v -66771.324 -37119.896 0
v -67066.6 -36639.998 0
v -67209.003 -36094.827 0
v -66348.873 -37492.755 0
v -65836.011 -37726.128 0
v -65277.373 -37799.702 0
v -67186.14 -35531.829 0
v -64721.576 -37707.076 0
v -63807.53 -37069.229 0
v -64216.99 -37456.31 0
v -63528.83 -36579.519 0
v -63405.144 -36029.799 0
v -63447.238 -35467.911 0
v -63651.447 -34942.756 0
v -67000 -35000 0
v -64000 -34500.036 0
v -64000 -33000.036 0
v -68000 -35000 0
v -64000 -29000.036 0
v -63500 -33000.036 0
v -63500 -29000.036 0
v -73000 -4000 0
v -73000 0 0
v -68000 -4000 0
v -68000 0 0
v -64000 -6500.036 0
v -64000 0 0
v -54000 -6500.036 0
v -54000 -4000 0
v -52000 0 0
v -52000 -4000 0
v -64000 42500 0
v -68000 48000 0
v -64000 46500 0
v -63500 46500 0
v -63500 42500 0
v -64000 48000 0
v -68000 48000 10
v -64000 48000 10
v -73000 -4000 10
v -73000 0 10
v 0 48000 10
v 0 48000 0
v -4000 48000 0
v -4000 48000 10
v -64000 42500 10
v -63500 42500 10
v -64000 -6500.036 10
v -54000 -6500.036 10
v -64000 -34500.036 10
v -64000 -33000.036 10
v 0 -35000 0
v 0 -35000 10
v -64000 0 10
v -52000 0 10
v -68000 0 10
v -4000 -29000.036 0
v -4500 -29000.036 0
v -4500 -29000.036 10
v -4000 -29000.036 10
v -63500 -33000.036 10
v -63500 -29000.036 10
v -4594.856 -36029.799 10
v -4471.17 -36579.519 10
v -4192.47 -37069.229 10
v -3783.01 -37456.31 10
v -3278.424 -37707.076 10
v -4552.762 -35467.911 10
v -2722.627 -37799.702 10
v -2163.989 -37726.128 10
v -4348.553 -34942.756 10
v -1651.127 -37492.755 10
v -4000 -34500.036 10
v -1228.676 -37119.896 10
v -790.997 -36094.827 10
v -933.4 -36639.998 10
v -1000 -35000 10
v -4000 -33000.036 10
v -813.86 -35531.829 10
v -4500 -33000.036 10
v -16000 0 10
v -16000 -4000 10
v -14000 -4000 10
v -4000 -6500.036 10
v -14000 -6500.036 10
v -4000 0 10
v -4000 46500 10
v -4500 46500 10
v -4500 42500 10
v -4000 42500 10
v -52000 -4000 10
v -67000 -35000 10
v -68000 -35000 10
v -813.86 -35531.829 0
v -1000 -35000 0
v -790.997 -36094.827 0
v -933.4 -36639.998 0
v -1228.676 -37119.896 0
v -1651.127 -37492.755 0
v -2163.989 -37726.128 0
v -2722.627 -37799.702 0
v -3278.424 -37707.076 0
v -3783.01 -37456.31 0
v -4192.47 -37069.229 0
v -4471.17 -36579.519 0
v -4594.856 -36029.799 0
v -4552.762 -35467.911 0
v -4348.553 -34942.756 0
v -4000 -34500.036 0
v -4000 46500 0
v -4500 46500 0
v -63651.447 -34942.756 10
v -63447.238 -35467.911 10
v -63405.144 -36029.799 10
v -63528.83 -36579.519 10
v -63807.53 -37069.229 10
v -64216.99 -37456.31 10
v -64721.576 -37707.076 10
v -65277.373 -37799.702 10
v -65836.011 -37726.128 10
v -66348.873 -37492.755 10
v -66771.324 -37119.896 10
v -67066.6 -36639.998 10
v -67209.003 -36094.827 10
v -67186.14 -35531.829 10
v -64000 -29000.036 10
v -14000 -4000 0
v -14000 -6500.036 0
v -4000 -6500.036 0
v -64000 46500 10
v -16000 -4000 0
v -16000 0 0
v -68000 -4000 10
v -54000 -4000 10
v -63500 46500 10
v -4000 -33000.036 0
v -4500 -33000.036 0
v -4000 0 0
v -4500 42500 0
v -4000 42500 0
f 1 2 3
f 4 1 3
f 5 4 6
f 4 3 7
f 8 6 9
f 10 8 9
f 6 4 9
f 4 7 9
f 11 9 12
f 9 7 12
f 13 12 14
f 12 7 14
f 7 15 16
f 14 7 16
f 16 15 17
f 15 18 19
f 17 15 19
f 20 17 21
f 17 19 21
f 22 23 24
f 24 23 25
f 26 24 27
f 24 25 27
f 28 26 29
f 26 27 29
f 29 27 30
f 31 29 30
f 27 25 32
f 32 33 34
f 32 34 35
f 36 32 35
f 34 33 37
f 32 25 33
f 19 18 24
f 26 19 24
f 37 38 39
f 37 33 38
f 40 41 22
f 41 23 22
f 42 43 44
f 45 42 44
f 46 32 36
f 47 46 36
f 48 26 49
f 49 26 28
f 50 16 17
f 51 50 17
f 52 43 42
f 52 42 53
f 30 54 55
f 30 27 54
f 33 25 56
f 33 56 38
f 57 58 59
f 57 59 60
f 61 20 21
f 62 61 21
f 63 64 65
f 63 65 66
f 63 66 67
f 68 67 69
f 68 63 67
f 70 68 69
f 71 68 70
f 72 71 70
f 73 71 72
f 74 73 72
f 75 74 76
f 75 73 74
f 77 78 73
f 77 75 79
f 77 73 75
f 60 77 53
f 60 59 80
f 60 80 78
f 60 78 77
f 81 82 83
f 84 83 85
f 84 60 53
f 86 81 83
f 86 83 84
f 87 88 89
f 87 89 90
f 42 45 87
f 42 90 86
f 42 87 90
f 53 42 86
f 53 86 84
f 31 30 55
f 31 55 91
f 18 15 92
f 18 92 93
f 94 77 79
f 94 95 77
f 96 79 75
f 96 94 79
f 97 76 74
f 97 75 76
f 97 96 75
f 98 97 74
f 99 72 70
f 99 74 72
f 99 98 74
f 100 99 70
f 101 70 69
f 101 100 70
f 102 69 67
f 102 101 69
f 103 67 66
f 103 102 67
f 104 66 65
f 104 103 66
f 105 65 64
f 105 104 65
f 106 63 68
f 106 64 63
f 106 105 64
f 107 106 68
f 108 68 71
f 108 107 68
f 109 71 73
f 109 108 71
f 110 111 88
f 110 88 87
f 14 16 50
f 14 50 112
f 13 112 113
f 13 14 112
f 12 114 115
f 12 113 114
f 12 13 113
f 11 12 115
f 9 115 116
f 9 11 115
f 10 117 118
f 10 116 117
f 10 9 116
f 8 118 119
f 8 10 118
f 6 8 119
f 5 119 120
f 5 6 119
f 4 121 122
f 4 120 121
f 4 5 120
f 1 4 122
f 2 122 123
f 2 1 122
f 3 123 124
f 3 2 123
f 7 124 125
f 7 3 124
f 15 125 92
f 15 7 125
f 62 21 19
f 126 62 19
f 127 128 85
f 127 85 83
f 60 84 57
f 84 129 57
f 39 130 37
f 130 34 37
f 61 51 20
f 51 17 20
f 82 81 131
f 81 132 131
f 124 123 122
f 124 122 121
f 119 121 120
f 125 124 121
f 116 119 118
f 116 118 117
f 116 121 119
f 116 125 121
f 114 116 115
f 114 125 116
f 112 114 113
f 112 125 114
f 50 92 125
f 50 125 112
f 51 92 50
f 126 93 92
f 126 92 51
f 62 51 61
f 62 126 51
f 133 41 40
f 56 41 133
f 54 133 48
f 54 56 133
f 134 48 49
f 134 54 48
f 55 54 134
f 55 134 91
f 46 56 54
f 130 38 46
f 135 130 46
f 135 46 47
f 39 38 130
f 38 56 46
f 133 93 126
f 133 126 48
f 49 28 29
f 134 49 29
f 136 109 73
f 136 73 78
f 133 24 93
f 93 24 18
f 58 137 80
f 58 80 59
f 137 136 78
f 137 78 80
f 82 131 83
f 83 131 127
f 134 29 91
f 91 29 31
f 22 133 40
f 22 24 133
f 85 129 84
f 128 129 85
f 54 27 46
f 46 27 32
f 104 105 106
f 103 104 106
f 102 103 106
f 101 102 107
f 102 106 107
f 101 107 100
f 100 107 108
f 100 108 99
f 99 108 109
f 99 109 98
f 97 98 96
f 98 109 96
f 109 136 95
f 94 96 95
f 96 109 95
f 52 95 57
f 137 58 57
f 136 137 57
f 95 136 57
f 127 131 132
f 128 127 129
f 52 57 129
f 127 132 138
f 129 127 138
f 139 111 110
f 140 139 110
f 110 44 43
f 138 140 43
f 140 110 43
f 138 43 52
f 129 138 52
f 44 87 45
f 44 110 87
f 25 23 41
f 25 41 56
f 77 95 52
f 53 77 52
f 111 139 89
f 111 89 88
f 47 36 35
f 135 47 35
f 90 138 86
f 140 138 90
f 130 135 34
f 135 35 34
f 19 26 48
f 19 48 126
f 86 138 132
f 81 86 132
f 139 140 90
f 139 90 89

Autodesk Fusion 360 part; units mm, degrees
sketch "スケッチ1" plane through (0, 0, 0) normal (0, 0, 1) x (1, 0, 0)
  line L0 (0, -4000) -> (0, -35000)
  line L1 (-4000, -6500.036) -> (-14000, -6500.036)
  line L2 (-34000, 2000) -> (-34000, -2000)
  line L3 (-63500, -29000.036) -> (-64000, -29000.036)
  line L4 (-63500, 42500) -> (-63500, 46500)
  line L5 (-64000, 46500) -> (-64000, 48000)
  line L6 (-64000, -6500.036) -> (-64000, -29000.036)
  line L7 (-14000, -6500.036) -> (-14000, -4000)
  line L8 (-68000, 41000) -> (-68000, 43977.4822)
  arc A0 (-67000, -35000) -> (-64000, -34500.036) centre (-65310.0198, -35889.9814) ccw
  line L9 (-1000, -35000) -> (0, -35000)
  arc A1 (-4000, -34500.036) -> (-1000, -35000) centre (-2689.9802, -35889.9814) ccw
  line L10 (-67000, -35000) -> (-68000, -35000)
  line L11 (-4000, 46500) -> (-4000, 48000)
  line L12 (-68000, 0) -> (-68000, 41000)
  line L13 (0, 41000) -> (0, 43977.4822)
  line L14 (-63500, 46500) -> (-64000, 46500)
  line L15 (-4500, 46500) -> (-4000, 46500)
  line L16 (-64000, 42500) -> (-63500, 42500)
  line L17 (-4000, -33000.036) -> (-4500, -33000.036)
  line L18 (-68000, 43977.4822) -> (-68000, 48000)
  line L19 (-68000, 48000) -> (-64000, 48000)
  line L20 (-78000, 0) -> (-79000, 0)
  line L21 (10000, 0) -> (11000, 0)
  line L22 (-64000, -6500.036) -> (-54000, -6500.036)
  line L23 (-63500, -33000.036) -> (-63500, -29000.036)
  line L24 (-64000, -34500.036) -> (-64000, -33000.036)
  line L25 (-64000, -33000.036) -> (-63500, -33000.036)
  line L26 (-68000, -4000) -> (-68000, -35000)
  line L27 (0, 0) -> (0, 41000)
  line L28 (-64000, 0) -> (-64000, 42500)
  line L29 (-54000, -6500.036) -> (-54000, -4000)
  line L30 (-4500, 42500) -> (-4500, 46500)
  line L31 (-4000, 42500) -> (-4500, 42500)
  line L32 (-4500, -29000.036) -> (-4000, -29000.036)
  line L33 (-4000, 0) -> (-4000, 42500)
  line L34 (-4500, -33000.036) -> (-4500, -29000.036)
  line L35 (-4000, -34500.036) -> (-4000, -33000.036)
  line L36 (0, 48000) -> (-4000, 48000)
  line L37 (-4000, -6500.036) -> (-4000, -29000.036)
  line L38 (0, 43977.4822) -> (0, 48000)
  line L39 (-64000, 0) -> (-52000, 0)
  line L40 (-52000, 0) -> (-52000, -4000)
  line L41 (-54000, -4000) -> (-52000, -4000)
  line L42 (-4000, 0) -> (-16000, 0)
  line L43 (-16000, 0) -> (-16000, -4000)
  line L44 (-16000, -4000) -> (-14000, -4000)
  line L45 (0, -4000) -> (0, 0)
  line L46 (-73000, 0) -> (-73000, -4000)
  line L47 (-73000, 0) -> (-68000, 0)
  line L48 (-68000, -4000) -> (-73000, -4000)
  point P0 (-4000, -35000)
  point P1 (-64000, -35000)
  point P2 (-64000, 42500)
  point P3 (-64000, -34500.036)
  point P4 (-68000, 0)
  point P5 (-64000, -6500.036)
  point P6 (-64000, 0)
  point P7 (-4000, 0)
  point P8 (-4000, 41000)
  point P9 (-4000, 42500)
  point P10 (-4000, -6500.036)
  point P11 (-4000, -34500.036)
  point P12 (-64000, 0)
  point P13 (-64000, 41000)
extrude "押し出し1" add sketch "スケッチ1" along normal blind 10 makes body 1 at (-60666.6667, -3500.012, 0) makes body 2 at (-7333.3333, -3500.012, 0)
